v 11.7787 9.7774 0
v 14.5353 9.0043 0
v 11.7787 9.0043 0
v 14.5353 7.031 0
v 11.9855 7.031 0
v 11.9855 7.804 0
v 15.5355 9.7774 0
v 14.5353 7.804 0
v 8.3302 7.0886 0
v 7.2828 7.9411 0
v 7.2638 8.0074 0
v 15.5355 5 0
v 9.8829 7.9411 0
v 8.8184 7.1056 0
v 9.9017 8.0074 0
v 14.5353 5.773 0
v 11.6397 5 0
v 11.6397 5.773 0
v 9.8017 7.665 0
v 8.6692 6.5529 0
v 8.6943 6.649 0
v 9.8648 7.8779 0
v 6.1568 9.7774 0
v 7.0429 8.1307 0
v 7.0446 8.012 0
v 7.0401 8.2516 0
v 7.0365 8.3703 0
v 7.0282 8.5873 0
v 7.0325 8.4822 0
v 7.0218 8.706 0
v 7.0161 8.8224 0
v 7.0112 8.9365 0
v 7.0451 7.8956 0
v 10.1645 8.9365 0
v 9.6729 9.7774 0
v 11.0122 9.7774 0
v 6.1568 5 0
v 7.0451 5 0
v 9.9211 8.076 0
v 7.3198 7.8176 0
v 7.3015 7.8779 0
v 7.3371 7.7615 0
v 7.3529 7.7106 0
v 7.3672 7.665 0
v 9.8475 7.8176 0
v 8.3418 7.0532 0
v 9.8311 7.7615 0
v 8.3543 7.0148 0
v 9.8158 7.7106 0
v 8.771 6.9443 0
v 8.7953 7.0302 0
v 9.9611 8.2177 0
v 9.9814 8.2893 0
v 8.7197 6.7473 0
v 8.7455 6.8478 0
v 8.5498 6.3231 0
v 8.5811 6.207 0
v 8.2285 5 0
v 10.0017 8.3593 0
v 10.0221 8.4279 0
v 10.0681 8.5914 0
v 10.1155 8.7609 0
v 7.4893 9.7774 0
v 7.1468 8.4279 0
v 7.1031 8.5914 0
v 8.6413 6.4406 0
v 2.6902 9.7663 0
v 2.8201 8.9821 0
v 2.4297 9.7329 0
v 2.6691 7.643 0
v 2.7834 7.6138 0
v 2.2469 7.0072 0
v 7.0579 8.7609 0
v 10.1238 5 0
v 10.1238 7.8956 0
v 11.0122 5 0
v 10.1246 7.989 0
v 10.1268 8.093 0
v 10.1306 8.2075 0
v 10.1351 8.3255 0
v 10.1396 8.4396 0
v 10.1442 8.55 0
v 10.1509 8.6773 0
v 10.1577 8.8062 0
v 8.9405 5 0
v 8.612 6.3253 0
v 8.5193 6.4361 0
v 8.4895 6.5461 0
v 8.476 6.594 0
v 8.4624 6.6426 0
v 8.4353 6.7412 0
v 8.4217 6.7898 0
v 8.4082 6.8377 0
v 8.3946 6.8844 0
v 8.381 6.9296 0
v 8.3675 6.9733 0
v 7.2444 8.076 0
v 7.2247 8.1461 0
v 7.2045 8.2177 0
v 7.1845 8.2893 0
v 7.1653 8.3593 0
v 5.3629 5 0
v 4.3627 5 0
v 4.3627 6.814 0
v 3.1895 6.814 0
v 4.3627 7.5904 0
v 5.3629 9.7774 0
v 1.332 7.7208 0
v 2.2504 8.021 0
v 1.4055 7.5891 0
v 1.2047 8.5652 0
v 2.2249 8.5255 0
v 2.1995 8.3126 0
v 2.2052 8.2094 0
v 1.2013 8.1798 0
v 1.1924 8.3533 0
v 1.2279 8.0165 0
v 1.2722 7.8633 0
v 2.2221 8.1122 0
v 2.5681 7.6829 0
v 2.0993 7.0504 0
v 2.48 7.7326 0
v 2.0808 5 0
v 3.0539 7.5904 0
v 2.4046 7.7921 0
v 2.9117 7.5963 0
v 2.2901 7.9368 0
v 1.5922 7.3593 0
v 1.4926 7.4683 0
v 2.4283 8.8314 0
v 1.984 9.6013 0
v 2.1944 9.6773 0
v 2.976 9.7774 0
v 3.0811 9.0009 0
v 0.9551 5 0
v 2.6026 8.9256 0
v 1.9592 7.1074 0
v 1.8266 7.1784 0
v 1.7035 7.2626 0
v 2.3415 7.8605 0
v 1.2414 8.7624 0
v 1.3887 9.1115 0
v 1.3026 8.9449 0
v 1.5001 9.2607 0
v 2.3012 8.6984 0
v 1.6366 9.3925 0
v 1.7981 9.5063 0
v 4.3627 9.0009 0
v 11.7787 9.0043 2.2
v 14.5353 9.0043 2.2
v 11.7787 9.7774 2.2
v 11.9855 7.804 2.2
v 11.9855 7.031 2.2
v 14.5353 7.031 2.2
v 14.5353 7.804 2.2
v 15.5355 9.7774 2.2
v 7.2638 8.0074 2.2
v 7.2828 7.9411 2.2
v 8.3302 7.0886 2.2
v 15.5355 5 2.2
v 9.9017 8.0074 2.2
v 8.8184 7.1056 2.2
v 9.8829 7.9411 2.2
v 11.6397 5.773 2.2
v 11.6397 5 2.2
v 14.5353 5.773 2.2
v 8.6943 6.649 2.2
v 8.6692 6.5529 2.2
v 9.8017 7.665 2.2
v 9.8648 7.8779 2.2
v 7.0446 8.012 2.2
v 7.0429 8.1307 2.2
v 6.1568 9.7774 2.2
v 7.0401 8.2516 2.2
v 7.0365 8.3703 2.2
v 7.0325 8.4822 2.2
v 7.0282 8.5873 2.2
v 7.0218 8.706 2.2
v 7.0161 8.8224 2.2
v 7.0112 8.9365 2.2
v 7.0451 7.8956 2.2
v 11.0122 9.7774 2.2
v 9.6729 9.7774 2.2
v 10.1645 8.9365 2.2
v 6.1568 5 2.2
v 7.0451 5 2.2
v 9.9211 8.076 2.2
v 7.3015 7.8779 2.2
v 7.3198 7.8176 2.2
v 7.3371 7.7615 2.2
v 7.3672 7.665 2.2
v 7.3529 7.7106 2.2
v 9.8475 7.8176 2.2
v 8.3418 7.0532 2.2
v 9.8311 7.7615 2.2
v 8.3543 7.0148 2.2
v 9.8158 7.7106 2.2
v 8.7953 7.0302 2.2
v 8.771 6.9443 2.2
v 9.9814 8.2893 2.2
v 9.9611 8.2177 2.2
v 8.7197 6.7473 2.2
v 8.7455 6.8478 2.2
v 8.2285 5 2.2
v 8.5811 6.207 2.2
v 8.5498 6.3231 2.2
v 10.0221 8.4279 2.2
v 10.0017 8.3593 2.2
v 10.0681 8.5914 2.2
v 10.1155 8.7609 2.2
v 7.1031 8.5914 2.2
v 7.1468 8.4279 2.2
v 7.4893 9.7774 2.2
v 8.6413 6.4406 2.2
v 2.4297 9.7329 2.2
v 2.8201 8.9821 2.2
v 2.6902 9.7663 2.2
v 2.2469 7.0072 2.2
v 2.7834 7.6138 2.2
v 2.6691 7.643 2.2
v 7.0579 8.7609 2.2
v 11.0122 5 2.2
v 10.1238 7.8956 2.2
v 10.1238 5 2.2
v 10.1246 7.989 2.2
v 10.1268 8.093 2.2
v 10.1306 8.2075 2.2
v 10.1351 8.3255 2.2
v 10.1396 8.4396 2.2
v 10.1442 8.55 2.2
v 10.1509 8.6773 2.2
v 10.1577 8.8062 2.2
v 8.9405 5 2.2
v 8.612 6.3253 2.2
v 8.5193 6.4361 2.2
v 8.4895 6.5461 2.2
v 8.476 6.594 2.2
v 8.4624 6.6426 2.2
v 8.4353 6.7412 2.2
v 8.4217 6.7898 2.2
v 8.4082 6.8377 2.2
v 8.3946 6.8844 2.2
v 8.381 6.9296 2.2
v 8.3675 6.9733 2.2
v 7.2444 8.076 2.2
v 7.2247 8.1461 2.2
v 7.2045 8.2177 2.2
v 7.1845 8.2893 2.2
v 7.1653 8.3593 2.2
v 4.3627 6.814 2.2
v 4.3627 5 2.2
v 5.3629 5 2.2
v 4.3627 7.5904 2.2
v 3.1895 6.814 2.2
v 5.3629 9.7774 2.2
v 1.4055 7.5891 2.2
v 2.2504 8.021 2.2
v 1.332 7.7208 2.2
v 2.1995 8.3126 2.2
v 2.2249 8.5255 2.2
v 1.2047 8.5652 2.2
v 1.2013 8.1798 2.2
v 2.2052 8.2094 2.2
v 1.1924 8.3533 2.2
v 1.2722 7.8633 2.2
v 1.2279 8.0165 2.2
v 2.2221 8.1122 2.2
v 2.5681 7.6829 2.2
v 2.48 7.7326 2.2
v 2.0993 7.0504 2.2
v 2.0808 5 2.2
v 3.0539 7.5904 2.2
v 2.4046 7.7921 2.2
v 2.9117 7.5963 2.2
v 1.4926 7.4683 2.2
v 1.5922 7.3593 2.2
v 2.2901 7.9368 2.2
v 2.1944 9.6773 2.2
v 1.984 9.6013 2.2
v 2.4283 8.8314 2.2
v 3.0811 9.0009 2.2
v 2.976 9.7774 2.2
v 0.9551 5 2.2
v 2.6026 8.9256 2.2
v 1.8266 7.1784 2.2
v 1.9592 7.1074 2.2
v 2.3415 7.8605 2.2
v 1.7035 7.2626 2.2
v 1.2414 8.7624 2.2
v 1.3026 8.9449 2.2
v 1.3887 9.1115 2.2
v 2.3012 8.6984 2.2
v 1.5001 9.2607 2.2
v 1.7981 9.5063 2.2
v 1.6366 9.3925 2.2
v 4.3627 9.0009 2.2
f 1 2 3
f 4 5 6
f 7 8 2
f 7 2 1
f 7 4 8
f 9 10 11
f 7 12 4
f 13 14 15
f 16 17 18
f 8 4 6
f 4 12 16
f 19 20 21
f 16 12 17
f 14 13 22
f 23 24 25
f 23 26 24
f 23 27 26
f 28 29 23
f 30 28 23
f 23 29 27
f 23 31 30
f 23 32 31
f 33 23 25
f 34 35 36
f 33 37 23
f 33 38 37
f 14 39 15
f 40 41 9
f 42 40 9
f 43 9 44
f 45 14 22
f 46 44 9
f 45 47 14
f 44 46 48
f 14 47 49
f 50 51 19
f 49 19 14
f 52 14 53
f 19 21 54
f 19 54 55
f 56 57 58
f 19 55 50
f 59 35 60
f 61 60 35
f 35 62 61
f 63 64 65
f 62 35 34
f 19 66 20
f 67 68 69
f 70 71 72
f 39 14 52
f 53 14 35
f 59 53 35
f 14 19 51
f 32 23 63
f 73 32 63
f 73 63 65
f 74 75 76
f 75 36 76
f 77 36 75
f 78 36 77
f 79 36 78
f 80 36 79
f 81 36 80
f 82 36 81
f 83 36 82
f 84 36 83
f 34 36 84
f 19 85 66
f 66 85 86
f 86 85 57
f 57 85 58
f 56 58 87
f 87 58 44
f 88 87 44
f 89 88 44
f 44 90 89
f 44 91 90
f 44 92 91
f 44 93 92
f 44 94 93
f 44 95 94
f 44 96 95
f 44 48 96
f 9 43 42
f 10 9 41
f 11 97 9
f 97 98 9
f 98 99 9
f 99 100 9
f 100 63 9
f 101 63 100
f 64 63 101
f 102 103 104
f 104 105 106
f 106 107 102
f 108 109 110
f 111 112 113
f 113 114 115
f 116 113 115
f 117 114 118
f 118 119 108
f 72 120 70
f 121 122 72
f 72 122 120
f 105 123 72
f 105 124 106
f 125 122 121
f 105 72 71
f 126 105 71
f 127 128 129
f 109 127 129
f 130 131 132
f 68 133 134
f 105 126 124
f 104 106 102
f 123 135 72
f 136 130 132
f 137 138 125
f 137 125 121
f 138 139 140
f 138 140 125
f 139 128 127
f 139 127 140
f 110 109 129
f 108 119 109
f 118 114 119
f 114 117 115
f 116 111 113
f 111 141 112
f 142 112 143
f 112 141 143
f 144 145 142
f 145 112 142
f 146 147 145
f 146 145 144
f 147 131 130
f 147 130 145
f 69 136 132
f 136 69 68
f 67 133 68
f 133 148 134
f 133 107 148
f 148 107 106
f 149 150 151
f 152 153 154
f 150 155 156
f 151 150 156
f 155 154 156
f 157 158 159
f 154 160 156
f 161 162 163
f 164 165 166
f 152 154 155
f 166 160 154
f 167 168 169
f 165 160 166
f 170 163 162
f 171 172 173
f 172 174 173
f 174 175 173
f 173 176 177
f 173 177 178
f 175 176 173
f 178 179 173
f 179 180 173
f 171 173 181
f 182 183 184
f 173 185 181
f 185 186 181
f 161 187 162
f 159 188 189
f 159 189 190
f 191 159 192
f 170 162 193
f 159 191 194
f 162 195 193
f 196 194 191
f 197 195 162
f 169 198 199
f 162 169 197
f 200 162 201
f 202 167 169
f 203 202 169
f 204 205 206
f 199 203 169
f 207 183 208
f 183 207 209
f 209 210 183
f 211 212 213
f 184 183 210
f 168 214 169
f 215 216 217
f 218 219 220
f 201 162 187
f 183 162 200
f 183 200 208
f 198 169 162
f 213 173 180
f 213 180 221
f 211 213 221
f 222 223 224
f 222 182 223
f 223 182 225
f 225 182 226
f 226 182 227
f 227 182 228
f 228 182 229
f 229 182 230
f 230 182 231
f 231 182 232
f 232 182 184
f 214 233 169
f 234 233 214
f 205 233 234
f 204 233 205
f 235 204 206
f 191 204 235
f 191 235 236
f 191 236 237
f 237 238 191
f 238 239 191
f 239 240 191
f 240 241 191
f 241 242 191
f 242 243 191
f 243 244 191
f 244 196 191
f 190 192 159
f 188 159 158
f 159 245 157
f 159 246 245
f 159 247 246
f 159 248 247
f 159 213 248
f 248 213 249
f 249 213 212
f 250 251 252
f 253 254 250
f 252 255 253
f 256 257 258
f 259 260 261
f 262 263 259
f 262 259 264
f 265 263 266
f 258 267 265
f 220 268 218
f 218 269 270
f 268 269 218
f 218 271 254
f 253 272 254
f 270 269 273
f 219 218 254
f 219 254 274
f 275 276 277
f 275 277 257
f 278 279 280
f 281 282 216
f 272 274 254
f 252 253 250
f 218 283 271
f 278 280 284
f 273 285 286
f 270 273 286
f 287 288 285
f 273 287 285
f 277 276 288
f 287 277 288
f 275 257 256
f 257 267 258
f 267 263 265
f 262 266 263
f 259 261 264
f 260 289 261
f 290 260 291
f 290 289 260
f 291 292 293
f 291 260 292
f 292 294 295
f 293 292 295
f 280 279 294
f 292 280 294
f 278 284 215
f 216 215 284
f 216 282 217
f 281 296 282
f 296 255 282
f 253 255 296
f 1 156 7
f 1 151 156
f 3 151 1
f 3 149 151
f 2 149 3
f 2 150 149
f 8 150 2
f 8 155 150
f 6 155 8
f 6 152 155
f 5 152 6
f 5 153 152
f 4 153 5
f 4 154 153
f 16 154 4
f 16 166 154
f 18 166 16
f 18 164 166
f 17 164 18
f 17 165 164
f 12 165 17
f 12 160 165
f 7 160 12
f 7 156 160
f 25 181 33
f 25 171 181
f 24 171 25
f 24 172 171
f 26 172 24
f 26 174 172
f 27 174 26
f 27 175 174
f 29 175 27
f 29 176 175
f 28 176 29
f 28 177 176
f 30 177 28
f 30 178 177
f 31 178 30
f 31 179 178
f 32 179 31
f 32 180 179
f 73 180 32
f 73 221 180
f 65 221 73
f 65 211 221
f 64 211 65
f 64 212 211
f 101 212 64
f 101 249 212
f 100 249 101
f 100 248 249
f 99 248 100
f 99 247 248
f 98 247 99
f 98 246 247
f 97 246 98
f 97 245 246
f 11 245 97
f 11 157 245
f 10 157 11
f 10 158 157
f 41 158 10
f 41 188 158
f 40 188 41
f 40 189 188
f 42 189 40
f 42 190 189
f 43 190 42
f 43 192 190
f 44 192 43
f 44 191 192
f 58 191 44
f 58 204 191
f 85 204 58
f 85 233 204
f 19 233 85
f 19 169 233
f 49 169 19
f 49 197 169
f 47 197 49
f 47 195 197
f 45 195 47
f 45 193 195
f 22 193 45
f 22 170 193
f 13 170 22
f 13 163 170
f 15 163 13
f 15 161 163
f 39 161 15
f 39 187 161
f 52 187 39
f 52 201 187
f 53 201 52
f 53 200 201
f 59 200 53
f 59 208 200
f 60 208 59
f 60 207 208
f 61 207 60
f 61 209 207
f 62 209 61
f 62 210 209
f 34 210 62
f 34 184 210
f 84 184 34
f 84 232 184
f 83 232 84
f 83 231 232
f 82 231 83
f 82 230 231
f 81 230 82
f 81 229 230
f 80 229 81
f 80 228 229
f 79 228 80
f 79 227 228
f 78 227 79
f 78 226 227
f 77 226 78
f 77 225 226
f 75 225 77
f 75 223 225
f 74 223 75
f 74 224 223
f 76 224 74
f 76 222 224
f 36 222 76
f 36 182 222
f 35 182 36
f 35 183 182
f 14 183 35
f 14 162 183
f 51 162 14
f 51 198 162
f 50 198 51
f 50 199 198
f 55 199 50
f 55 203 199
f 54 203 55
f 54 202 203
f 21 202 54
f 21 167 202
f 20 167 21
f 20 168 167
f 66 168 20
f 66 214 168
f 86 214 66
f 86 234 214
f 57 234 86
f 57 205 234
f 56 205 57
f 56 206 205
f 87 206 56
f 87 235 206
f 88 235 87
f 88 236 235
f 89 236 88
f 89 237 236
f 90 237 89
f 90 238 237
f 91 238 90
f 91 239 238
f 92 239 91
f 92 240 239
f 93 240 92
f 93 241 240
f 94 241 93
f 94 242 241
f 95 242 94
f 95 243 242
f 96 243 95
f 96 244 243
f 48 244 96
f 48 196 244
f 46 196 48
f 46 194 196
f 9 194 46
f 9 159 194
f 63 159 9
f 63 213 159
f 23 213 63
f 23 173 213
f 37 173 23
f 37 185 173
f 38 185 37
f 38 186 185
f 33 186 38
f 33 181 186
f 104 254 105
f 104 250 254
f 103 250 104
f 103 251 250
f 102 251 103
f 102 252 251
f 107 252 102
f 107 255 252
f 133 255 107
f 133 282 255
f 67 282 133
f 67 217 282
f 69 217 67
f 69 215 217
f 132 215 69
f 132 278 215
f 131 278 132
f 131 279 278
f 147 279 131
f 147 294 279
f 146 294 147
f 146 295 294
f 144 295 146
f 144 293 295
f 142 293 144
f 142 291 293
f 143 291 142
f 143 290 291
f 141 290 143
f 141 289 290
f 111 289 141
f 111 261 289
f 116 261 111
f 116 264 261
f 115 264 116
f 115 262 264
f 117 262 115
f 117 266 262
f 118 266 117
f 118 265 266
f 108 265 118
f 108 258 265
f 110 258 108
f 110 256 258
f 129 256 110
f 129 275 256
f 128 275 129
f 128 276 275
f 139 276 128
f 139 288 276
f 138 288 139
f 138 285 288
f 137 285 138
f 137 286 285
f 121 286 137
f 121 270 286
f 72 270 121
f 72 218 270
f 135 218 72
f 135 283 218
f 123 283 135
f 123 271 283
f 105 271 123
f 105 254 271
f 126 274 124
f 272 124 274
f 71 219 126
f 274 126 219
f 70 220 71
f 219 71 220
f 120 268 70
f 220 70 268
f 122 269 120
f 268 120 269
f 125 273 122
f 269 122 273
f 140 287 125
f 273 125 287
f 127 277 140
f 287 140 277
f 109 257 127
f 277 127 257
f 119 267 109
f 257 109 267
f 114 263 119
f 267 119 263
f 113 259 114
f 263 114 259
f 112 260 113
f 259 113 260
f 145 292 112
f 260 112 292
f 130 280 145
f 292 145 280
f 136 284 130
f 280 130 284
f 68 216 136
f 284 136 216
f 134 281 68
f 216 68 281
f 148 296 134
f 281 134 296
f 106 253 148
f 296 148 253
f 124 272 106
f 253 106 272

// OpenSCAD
difference(){
    scale([0.35, 0.35,1])
    linear_extrude(height = 3)
    import("EMR_keychain_pre_processed.dxf");

    color("red")
    translate([1.5,21.5,1])
    linear_extrude(height = 3)
    scale([1.05, 1.05, 1])
    text("EMR", size=5, font="Liberation Sans:style=Bold");
    
    translate([2.5,30.5,-1])
    cylinder(r=1.25, h=5, $fn=100);
}

translate([16,5,0])
linear_extrude(height = 2.2)
rotate([0,180,0])
scale([1, 1, 1])
text("EMR", size=5, font="Liberation Sans:style=Bold");
